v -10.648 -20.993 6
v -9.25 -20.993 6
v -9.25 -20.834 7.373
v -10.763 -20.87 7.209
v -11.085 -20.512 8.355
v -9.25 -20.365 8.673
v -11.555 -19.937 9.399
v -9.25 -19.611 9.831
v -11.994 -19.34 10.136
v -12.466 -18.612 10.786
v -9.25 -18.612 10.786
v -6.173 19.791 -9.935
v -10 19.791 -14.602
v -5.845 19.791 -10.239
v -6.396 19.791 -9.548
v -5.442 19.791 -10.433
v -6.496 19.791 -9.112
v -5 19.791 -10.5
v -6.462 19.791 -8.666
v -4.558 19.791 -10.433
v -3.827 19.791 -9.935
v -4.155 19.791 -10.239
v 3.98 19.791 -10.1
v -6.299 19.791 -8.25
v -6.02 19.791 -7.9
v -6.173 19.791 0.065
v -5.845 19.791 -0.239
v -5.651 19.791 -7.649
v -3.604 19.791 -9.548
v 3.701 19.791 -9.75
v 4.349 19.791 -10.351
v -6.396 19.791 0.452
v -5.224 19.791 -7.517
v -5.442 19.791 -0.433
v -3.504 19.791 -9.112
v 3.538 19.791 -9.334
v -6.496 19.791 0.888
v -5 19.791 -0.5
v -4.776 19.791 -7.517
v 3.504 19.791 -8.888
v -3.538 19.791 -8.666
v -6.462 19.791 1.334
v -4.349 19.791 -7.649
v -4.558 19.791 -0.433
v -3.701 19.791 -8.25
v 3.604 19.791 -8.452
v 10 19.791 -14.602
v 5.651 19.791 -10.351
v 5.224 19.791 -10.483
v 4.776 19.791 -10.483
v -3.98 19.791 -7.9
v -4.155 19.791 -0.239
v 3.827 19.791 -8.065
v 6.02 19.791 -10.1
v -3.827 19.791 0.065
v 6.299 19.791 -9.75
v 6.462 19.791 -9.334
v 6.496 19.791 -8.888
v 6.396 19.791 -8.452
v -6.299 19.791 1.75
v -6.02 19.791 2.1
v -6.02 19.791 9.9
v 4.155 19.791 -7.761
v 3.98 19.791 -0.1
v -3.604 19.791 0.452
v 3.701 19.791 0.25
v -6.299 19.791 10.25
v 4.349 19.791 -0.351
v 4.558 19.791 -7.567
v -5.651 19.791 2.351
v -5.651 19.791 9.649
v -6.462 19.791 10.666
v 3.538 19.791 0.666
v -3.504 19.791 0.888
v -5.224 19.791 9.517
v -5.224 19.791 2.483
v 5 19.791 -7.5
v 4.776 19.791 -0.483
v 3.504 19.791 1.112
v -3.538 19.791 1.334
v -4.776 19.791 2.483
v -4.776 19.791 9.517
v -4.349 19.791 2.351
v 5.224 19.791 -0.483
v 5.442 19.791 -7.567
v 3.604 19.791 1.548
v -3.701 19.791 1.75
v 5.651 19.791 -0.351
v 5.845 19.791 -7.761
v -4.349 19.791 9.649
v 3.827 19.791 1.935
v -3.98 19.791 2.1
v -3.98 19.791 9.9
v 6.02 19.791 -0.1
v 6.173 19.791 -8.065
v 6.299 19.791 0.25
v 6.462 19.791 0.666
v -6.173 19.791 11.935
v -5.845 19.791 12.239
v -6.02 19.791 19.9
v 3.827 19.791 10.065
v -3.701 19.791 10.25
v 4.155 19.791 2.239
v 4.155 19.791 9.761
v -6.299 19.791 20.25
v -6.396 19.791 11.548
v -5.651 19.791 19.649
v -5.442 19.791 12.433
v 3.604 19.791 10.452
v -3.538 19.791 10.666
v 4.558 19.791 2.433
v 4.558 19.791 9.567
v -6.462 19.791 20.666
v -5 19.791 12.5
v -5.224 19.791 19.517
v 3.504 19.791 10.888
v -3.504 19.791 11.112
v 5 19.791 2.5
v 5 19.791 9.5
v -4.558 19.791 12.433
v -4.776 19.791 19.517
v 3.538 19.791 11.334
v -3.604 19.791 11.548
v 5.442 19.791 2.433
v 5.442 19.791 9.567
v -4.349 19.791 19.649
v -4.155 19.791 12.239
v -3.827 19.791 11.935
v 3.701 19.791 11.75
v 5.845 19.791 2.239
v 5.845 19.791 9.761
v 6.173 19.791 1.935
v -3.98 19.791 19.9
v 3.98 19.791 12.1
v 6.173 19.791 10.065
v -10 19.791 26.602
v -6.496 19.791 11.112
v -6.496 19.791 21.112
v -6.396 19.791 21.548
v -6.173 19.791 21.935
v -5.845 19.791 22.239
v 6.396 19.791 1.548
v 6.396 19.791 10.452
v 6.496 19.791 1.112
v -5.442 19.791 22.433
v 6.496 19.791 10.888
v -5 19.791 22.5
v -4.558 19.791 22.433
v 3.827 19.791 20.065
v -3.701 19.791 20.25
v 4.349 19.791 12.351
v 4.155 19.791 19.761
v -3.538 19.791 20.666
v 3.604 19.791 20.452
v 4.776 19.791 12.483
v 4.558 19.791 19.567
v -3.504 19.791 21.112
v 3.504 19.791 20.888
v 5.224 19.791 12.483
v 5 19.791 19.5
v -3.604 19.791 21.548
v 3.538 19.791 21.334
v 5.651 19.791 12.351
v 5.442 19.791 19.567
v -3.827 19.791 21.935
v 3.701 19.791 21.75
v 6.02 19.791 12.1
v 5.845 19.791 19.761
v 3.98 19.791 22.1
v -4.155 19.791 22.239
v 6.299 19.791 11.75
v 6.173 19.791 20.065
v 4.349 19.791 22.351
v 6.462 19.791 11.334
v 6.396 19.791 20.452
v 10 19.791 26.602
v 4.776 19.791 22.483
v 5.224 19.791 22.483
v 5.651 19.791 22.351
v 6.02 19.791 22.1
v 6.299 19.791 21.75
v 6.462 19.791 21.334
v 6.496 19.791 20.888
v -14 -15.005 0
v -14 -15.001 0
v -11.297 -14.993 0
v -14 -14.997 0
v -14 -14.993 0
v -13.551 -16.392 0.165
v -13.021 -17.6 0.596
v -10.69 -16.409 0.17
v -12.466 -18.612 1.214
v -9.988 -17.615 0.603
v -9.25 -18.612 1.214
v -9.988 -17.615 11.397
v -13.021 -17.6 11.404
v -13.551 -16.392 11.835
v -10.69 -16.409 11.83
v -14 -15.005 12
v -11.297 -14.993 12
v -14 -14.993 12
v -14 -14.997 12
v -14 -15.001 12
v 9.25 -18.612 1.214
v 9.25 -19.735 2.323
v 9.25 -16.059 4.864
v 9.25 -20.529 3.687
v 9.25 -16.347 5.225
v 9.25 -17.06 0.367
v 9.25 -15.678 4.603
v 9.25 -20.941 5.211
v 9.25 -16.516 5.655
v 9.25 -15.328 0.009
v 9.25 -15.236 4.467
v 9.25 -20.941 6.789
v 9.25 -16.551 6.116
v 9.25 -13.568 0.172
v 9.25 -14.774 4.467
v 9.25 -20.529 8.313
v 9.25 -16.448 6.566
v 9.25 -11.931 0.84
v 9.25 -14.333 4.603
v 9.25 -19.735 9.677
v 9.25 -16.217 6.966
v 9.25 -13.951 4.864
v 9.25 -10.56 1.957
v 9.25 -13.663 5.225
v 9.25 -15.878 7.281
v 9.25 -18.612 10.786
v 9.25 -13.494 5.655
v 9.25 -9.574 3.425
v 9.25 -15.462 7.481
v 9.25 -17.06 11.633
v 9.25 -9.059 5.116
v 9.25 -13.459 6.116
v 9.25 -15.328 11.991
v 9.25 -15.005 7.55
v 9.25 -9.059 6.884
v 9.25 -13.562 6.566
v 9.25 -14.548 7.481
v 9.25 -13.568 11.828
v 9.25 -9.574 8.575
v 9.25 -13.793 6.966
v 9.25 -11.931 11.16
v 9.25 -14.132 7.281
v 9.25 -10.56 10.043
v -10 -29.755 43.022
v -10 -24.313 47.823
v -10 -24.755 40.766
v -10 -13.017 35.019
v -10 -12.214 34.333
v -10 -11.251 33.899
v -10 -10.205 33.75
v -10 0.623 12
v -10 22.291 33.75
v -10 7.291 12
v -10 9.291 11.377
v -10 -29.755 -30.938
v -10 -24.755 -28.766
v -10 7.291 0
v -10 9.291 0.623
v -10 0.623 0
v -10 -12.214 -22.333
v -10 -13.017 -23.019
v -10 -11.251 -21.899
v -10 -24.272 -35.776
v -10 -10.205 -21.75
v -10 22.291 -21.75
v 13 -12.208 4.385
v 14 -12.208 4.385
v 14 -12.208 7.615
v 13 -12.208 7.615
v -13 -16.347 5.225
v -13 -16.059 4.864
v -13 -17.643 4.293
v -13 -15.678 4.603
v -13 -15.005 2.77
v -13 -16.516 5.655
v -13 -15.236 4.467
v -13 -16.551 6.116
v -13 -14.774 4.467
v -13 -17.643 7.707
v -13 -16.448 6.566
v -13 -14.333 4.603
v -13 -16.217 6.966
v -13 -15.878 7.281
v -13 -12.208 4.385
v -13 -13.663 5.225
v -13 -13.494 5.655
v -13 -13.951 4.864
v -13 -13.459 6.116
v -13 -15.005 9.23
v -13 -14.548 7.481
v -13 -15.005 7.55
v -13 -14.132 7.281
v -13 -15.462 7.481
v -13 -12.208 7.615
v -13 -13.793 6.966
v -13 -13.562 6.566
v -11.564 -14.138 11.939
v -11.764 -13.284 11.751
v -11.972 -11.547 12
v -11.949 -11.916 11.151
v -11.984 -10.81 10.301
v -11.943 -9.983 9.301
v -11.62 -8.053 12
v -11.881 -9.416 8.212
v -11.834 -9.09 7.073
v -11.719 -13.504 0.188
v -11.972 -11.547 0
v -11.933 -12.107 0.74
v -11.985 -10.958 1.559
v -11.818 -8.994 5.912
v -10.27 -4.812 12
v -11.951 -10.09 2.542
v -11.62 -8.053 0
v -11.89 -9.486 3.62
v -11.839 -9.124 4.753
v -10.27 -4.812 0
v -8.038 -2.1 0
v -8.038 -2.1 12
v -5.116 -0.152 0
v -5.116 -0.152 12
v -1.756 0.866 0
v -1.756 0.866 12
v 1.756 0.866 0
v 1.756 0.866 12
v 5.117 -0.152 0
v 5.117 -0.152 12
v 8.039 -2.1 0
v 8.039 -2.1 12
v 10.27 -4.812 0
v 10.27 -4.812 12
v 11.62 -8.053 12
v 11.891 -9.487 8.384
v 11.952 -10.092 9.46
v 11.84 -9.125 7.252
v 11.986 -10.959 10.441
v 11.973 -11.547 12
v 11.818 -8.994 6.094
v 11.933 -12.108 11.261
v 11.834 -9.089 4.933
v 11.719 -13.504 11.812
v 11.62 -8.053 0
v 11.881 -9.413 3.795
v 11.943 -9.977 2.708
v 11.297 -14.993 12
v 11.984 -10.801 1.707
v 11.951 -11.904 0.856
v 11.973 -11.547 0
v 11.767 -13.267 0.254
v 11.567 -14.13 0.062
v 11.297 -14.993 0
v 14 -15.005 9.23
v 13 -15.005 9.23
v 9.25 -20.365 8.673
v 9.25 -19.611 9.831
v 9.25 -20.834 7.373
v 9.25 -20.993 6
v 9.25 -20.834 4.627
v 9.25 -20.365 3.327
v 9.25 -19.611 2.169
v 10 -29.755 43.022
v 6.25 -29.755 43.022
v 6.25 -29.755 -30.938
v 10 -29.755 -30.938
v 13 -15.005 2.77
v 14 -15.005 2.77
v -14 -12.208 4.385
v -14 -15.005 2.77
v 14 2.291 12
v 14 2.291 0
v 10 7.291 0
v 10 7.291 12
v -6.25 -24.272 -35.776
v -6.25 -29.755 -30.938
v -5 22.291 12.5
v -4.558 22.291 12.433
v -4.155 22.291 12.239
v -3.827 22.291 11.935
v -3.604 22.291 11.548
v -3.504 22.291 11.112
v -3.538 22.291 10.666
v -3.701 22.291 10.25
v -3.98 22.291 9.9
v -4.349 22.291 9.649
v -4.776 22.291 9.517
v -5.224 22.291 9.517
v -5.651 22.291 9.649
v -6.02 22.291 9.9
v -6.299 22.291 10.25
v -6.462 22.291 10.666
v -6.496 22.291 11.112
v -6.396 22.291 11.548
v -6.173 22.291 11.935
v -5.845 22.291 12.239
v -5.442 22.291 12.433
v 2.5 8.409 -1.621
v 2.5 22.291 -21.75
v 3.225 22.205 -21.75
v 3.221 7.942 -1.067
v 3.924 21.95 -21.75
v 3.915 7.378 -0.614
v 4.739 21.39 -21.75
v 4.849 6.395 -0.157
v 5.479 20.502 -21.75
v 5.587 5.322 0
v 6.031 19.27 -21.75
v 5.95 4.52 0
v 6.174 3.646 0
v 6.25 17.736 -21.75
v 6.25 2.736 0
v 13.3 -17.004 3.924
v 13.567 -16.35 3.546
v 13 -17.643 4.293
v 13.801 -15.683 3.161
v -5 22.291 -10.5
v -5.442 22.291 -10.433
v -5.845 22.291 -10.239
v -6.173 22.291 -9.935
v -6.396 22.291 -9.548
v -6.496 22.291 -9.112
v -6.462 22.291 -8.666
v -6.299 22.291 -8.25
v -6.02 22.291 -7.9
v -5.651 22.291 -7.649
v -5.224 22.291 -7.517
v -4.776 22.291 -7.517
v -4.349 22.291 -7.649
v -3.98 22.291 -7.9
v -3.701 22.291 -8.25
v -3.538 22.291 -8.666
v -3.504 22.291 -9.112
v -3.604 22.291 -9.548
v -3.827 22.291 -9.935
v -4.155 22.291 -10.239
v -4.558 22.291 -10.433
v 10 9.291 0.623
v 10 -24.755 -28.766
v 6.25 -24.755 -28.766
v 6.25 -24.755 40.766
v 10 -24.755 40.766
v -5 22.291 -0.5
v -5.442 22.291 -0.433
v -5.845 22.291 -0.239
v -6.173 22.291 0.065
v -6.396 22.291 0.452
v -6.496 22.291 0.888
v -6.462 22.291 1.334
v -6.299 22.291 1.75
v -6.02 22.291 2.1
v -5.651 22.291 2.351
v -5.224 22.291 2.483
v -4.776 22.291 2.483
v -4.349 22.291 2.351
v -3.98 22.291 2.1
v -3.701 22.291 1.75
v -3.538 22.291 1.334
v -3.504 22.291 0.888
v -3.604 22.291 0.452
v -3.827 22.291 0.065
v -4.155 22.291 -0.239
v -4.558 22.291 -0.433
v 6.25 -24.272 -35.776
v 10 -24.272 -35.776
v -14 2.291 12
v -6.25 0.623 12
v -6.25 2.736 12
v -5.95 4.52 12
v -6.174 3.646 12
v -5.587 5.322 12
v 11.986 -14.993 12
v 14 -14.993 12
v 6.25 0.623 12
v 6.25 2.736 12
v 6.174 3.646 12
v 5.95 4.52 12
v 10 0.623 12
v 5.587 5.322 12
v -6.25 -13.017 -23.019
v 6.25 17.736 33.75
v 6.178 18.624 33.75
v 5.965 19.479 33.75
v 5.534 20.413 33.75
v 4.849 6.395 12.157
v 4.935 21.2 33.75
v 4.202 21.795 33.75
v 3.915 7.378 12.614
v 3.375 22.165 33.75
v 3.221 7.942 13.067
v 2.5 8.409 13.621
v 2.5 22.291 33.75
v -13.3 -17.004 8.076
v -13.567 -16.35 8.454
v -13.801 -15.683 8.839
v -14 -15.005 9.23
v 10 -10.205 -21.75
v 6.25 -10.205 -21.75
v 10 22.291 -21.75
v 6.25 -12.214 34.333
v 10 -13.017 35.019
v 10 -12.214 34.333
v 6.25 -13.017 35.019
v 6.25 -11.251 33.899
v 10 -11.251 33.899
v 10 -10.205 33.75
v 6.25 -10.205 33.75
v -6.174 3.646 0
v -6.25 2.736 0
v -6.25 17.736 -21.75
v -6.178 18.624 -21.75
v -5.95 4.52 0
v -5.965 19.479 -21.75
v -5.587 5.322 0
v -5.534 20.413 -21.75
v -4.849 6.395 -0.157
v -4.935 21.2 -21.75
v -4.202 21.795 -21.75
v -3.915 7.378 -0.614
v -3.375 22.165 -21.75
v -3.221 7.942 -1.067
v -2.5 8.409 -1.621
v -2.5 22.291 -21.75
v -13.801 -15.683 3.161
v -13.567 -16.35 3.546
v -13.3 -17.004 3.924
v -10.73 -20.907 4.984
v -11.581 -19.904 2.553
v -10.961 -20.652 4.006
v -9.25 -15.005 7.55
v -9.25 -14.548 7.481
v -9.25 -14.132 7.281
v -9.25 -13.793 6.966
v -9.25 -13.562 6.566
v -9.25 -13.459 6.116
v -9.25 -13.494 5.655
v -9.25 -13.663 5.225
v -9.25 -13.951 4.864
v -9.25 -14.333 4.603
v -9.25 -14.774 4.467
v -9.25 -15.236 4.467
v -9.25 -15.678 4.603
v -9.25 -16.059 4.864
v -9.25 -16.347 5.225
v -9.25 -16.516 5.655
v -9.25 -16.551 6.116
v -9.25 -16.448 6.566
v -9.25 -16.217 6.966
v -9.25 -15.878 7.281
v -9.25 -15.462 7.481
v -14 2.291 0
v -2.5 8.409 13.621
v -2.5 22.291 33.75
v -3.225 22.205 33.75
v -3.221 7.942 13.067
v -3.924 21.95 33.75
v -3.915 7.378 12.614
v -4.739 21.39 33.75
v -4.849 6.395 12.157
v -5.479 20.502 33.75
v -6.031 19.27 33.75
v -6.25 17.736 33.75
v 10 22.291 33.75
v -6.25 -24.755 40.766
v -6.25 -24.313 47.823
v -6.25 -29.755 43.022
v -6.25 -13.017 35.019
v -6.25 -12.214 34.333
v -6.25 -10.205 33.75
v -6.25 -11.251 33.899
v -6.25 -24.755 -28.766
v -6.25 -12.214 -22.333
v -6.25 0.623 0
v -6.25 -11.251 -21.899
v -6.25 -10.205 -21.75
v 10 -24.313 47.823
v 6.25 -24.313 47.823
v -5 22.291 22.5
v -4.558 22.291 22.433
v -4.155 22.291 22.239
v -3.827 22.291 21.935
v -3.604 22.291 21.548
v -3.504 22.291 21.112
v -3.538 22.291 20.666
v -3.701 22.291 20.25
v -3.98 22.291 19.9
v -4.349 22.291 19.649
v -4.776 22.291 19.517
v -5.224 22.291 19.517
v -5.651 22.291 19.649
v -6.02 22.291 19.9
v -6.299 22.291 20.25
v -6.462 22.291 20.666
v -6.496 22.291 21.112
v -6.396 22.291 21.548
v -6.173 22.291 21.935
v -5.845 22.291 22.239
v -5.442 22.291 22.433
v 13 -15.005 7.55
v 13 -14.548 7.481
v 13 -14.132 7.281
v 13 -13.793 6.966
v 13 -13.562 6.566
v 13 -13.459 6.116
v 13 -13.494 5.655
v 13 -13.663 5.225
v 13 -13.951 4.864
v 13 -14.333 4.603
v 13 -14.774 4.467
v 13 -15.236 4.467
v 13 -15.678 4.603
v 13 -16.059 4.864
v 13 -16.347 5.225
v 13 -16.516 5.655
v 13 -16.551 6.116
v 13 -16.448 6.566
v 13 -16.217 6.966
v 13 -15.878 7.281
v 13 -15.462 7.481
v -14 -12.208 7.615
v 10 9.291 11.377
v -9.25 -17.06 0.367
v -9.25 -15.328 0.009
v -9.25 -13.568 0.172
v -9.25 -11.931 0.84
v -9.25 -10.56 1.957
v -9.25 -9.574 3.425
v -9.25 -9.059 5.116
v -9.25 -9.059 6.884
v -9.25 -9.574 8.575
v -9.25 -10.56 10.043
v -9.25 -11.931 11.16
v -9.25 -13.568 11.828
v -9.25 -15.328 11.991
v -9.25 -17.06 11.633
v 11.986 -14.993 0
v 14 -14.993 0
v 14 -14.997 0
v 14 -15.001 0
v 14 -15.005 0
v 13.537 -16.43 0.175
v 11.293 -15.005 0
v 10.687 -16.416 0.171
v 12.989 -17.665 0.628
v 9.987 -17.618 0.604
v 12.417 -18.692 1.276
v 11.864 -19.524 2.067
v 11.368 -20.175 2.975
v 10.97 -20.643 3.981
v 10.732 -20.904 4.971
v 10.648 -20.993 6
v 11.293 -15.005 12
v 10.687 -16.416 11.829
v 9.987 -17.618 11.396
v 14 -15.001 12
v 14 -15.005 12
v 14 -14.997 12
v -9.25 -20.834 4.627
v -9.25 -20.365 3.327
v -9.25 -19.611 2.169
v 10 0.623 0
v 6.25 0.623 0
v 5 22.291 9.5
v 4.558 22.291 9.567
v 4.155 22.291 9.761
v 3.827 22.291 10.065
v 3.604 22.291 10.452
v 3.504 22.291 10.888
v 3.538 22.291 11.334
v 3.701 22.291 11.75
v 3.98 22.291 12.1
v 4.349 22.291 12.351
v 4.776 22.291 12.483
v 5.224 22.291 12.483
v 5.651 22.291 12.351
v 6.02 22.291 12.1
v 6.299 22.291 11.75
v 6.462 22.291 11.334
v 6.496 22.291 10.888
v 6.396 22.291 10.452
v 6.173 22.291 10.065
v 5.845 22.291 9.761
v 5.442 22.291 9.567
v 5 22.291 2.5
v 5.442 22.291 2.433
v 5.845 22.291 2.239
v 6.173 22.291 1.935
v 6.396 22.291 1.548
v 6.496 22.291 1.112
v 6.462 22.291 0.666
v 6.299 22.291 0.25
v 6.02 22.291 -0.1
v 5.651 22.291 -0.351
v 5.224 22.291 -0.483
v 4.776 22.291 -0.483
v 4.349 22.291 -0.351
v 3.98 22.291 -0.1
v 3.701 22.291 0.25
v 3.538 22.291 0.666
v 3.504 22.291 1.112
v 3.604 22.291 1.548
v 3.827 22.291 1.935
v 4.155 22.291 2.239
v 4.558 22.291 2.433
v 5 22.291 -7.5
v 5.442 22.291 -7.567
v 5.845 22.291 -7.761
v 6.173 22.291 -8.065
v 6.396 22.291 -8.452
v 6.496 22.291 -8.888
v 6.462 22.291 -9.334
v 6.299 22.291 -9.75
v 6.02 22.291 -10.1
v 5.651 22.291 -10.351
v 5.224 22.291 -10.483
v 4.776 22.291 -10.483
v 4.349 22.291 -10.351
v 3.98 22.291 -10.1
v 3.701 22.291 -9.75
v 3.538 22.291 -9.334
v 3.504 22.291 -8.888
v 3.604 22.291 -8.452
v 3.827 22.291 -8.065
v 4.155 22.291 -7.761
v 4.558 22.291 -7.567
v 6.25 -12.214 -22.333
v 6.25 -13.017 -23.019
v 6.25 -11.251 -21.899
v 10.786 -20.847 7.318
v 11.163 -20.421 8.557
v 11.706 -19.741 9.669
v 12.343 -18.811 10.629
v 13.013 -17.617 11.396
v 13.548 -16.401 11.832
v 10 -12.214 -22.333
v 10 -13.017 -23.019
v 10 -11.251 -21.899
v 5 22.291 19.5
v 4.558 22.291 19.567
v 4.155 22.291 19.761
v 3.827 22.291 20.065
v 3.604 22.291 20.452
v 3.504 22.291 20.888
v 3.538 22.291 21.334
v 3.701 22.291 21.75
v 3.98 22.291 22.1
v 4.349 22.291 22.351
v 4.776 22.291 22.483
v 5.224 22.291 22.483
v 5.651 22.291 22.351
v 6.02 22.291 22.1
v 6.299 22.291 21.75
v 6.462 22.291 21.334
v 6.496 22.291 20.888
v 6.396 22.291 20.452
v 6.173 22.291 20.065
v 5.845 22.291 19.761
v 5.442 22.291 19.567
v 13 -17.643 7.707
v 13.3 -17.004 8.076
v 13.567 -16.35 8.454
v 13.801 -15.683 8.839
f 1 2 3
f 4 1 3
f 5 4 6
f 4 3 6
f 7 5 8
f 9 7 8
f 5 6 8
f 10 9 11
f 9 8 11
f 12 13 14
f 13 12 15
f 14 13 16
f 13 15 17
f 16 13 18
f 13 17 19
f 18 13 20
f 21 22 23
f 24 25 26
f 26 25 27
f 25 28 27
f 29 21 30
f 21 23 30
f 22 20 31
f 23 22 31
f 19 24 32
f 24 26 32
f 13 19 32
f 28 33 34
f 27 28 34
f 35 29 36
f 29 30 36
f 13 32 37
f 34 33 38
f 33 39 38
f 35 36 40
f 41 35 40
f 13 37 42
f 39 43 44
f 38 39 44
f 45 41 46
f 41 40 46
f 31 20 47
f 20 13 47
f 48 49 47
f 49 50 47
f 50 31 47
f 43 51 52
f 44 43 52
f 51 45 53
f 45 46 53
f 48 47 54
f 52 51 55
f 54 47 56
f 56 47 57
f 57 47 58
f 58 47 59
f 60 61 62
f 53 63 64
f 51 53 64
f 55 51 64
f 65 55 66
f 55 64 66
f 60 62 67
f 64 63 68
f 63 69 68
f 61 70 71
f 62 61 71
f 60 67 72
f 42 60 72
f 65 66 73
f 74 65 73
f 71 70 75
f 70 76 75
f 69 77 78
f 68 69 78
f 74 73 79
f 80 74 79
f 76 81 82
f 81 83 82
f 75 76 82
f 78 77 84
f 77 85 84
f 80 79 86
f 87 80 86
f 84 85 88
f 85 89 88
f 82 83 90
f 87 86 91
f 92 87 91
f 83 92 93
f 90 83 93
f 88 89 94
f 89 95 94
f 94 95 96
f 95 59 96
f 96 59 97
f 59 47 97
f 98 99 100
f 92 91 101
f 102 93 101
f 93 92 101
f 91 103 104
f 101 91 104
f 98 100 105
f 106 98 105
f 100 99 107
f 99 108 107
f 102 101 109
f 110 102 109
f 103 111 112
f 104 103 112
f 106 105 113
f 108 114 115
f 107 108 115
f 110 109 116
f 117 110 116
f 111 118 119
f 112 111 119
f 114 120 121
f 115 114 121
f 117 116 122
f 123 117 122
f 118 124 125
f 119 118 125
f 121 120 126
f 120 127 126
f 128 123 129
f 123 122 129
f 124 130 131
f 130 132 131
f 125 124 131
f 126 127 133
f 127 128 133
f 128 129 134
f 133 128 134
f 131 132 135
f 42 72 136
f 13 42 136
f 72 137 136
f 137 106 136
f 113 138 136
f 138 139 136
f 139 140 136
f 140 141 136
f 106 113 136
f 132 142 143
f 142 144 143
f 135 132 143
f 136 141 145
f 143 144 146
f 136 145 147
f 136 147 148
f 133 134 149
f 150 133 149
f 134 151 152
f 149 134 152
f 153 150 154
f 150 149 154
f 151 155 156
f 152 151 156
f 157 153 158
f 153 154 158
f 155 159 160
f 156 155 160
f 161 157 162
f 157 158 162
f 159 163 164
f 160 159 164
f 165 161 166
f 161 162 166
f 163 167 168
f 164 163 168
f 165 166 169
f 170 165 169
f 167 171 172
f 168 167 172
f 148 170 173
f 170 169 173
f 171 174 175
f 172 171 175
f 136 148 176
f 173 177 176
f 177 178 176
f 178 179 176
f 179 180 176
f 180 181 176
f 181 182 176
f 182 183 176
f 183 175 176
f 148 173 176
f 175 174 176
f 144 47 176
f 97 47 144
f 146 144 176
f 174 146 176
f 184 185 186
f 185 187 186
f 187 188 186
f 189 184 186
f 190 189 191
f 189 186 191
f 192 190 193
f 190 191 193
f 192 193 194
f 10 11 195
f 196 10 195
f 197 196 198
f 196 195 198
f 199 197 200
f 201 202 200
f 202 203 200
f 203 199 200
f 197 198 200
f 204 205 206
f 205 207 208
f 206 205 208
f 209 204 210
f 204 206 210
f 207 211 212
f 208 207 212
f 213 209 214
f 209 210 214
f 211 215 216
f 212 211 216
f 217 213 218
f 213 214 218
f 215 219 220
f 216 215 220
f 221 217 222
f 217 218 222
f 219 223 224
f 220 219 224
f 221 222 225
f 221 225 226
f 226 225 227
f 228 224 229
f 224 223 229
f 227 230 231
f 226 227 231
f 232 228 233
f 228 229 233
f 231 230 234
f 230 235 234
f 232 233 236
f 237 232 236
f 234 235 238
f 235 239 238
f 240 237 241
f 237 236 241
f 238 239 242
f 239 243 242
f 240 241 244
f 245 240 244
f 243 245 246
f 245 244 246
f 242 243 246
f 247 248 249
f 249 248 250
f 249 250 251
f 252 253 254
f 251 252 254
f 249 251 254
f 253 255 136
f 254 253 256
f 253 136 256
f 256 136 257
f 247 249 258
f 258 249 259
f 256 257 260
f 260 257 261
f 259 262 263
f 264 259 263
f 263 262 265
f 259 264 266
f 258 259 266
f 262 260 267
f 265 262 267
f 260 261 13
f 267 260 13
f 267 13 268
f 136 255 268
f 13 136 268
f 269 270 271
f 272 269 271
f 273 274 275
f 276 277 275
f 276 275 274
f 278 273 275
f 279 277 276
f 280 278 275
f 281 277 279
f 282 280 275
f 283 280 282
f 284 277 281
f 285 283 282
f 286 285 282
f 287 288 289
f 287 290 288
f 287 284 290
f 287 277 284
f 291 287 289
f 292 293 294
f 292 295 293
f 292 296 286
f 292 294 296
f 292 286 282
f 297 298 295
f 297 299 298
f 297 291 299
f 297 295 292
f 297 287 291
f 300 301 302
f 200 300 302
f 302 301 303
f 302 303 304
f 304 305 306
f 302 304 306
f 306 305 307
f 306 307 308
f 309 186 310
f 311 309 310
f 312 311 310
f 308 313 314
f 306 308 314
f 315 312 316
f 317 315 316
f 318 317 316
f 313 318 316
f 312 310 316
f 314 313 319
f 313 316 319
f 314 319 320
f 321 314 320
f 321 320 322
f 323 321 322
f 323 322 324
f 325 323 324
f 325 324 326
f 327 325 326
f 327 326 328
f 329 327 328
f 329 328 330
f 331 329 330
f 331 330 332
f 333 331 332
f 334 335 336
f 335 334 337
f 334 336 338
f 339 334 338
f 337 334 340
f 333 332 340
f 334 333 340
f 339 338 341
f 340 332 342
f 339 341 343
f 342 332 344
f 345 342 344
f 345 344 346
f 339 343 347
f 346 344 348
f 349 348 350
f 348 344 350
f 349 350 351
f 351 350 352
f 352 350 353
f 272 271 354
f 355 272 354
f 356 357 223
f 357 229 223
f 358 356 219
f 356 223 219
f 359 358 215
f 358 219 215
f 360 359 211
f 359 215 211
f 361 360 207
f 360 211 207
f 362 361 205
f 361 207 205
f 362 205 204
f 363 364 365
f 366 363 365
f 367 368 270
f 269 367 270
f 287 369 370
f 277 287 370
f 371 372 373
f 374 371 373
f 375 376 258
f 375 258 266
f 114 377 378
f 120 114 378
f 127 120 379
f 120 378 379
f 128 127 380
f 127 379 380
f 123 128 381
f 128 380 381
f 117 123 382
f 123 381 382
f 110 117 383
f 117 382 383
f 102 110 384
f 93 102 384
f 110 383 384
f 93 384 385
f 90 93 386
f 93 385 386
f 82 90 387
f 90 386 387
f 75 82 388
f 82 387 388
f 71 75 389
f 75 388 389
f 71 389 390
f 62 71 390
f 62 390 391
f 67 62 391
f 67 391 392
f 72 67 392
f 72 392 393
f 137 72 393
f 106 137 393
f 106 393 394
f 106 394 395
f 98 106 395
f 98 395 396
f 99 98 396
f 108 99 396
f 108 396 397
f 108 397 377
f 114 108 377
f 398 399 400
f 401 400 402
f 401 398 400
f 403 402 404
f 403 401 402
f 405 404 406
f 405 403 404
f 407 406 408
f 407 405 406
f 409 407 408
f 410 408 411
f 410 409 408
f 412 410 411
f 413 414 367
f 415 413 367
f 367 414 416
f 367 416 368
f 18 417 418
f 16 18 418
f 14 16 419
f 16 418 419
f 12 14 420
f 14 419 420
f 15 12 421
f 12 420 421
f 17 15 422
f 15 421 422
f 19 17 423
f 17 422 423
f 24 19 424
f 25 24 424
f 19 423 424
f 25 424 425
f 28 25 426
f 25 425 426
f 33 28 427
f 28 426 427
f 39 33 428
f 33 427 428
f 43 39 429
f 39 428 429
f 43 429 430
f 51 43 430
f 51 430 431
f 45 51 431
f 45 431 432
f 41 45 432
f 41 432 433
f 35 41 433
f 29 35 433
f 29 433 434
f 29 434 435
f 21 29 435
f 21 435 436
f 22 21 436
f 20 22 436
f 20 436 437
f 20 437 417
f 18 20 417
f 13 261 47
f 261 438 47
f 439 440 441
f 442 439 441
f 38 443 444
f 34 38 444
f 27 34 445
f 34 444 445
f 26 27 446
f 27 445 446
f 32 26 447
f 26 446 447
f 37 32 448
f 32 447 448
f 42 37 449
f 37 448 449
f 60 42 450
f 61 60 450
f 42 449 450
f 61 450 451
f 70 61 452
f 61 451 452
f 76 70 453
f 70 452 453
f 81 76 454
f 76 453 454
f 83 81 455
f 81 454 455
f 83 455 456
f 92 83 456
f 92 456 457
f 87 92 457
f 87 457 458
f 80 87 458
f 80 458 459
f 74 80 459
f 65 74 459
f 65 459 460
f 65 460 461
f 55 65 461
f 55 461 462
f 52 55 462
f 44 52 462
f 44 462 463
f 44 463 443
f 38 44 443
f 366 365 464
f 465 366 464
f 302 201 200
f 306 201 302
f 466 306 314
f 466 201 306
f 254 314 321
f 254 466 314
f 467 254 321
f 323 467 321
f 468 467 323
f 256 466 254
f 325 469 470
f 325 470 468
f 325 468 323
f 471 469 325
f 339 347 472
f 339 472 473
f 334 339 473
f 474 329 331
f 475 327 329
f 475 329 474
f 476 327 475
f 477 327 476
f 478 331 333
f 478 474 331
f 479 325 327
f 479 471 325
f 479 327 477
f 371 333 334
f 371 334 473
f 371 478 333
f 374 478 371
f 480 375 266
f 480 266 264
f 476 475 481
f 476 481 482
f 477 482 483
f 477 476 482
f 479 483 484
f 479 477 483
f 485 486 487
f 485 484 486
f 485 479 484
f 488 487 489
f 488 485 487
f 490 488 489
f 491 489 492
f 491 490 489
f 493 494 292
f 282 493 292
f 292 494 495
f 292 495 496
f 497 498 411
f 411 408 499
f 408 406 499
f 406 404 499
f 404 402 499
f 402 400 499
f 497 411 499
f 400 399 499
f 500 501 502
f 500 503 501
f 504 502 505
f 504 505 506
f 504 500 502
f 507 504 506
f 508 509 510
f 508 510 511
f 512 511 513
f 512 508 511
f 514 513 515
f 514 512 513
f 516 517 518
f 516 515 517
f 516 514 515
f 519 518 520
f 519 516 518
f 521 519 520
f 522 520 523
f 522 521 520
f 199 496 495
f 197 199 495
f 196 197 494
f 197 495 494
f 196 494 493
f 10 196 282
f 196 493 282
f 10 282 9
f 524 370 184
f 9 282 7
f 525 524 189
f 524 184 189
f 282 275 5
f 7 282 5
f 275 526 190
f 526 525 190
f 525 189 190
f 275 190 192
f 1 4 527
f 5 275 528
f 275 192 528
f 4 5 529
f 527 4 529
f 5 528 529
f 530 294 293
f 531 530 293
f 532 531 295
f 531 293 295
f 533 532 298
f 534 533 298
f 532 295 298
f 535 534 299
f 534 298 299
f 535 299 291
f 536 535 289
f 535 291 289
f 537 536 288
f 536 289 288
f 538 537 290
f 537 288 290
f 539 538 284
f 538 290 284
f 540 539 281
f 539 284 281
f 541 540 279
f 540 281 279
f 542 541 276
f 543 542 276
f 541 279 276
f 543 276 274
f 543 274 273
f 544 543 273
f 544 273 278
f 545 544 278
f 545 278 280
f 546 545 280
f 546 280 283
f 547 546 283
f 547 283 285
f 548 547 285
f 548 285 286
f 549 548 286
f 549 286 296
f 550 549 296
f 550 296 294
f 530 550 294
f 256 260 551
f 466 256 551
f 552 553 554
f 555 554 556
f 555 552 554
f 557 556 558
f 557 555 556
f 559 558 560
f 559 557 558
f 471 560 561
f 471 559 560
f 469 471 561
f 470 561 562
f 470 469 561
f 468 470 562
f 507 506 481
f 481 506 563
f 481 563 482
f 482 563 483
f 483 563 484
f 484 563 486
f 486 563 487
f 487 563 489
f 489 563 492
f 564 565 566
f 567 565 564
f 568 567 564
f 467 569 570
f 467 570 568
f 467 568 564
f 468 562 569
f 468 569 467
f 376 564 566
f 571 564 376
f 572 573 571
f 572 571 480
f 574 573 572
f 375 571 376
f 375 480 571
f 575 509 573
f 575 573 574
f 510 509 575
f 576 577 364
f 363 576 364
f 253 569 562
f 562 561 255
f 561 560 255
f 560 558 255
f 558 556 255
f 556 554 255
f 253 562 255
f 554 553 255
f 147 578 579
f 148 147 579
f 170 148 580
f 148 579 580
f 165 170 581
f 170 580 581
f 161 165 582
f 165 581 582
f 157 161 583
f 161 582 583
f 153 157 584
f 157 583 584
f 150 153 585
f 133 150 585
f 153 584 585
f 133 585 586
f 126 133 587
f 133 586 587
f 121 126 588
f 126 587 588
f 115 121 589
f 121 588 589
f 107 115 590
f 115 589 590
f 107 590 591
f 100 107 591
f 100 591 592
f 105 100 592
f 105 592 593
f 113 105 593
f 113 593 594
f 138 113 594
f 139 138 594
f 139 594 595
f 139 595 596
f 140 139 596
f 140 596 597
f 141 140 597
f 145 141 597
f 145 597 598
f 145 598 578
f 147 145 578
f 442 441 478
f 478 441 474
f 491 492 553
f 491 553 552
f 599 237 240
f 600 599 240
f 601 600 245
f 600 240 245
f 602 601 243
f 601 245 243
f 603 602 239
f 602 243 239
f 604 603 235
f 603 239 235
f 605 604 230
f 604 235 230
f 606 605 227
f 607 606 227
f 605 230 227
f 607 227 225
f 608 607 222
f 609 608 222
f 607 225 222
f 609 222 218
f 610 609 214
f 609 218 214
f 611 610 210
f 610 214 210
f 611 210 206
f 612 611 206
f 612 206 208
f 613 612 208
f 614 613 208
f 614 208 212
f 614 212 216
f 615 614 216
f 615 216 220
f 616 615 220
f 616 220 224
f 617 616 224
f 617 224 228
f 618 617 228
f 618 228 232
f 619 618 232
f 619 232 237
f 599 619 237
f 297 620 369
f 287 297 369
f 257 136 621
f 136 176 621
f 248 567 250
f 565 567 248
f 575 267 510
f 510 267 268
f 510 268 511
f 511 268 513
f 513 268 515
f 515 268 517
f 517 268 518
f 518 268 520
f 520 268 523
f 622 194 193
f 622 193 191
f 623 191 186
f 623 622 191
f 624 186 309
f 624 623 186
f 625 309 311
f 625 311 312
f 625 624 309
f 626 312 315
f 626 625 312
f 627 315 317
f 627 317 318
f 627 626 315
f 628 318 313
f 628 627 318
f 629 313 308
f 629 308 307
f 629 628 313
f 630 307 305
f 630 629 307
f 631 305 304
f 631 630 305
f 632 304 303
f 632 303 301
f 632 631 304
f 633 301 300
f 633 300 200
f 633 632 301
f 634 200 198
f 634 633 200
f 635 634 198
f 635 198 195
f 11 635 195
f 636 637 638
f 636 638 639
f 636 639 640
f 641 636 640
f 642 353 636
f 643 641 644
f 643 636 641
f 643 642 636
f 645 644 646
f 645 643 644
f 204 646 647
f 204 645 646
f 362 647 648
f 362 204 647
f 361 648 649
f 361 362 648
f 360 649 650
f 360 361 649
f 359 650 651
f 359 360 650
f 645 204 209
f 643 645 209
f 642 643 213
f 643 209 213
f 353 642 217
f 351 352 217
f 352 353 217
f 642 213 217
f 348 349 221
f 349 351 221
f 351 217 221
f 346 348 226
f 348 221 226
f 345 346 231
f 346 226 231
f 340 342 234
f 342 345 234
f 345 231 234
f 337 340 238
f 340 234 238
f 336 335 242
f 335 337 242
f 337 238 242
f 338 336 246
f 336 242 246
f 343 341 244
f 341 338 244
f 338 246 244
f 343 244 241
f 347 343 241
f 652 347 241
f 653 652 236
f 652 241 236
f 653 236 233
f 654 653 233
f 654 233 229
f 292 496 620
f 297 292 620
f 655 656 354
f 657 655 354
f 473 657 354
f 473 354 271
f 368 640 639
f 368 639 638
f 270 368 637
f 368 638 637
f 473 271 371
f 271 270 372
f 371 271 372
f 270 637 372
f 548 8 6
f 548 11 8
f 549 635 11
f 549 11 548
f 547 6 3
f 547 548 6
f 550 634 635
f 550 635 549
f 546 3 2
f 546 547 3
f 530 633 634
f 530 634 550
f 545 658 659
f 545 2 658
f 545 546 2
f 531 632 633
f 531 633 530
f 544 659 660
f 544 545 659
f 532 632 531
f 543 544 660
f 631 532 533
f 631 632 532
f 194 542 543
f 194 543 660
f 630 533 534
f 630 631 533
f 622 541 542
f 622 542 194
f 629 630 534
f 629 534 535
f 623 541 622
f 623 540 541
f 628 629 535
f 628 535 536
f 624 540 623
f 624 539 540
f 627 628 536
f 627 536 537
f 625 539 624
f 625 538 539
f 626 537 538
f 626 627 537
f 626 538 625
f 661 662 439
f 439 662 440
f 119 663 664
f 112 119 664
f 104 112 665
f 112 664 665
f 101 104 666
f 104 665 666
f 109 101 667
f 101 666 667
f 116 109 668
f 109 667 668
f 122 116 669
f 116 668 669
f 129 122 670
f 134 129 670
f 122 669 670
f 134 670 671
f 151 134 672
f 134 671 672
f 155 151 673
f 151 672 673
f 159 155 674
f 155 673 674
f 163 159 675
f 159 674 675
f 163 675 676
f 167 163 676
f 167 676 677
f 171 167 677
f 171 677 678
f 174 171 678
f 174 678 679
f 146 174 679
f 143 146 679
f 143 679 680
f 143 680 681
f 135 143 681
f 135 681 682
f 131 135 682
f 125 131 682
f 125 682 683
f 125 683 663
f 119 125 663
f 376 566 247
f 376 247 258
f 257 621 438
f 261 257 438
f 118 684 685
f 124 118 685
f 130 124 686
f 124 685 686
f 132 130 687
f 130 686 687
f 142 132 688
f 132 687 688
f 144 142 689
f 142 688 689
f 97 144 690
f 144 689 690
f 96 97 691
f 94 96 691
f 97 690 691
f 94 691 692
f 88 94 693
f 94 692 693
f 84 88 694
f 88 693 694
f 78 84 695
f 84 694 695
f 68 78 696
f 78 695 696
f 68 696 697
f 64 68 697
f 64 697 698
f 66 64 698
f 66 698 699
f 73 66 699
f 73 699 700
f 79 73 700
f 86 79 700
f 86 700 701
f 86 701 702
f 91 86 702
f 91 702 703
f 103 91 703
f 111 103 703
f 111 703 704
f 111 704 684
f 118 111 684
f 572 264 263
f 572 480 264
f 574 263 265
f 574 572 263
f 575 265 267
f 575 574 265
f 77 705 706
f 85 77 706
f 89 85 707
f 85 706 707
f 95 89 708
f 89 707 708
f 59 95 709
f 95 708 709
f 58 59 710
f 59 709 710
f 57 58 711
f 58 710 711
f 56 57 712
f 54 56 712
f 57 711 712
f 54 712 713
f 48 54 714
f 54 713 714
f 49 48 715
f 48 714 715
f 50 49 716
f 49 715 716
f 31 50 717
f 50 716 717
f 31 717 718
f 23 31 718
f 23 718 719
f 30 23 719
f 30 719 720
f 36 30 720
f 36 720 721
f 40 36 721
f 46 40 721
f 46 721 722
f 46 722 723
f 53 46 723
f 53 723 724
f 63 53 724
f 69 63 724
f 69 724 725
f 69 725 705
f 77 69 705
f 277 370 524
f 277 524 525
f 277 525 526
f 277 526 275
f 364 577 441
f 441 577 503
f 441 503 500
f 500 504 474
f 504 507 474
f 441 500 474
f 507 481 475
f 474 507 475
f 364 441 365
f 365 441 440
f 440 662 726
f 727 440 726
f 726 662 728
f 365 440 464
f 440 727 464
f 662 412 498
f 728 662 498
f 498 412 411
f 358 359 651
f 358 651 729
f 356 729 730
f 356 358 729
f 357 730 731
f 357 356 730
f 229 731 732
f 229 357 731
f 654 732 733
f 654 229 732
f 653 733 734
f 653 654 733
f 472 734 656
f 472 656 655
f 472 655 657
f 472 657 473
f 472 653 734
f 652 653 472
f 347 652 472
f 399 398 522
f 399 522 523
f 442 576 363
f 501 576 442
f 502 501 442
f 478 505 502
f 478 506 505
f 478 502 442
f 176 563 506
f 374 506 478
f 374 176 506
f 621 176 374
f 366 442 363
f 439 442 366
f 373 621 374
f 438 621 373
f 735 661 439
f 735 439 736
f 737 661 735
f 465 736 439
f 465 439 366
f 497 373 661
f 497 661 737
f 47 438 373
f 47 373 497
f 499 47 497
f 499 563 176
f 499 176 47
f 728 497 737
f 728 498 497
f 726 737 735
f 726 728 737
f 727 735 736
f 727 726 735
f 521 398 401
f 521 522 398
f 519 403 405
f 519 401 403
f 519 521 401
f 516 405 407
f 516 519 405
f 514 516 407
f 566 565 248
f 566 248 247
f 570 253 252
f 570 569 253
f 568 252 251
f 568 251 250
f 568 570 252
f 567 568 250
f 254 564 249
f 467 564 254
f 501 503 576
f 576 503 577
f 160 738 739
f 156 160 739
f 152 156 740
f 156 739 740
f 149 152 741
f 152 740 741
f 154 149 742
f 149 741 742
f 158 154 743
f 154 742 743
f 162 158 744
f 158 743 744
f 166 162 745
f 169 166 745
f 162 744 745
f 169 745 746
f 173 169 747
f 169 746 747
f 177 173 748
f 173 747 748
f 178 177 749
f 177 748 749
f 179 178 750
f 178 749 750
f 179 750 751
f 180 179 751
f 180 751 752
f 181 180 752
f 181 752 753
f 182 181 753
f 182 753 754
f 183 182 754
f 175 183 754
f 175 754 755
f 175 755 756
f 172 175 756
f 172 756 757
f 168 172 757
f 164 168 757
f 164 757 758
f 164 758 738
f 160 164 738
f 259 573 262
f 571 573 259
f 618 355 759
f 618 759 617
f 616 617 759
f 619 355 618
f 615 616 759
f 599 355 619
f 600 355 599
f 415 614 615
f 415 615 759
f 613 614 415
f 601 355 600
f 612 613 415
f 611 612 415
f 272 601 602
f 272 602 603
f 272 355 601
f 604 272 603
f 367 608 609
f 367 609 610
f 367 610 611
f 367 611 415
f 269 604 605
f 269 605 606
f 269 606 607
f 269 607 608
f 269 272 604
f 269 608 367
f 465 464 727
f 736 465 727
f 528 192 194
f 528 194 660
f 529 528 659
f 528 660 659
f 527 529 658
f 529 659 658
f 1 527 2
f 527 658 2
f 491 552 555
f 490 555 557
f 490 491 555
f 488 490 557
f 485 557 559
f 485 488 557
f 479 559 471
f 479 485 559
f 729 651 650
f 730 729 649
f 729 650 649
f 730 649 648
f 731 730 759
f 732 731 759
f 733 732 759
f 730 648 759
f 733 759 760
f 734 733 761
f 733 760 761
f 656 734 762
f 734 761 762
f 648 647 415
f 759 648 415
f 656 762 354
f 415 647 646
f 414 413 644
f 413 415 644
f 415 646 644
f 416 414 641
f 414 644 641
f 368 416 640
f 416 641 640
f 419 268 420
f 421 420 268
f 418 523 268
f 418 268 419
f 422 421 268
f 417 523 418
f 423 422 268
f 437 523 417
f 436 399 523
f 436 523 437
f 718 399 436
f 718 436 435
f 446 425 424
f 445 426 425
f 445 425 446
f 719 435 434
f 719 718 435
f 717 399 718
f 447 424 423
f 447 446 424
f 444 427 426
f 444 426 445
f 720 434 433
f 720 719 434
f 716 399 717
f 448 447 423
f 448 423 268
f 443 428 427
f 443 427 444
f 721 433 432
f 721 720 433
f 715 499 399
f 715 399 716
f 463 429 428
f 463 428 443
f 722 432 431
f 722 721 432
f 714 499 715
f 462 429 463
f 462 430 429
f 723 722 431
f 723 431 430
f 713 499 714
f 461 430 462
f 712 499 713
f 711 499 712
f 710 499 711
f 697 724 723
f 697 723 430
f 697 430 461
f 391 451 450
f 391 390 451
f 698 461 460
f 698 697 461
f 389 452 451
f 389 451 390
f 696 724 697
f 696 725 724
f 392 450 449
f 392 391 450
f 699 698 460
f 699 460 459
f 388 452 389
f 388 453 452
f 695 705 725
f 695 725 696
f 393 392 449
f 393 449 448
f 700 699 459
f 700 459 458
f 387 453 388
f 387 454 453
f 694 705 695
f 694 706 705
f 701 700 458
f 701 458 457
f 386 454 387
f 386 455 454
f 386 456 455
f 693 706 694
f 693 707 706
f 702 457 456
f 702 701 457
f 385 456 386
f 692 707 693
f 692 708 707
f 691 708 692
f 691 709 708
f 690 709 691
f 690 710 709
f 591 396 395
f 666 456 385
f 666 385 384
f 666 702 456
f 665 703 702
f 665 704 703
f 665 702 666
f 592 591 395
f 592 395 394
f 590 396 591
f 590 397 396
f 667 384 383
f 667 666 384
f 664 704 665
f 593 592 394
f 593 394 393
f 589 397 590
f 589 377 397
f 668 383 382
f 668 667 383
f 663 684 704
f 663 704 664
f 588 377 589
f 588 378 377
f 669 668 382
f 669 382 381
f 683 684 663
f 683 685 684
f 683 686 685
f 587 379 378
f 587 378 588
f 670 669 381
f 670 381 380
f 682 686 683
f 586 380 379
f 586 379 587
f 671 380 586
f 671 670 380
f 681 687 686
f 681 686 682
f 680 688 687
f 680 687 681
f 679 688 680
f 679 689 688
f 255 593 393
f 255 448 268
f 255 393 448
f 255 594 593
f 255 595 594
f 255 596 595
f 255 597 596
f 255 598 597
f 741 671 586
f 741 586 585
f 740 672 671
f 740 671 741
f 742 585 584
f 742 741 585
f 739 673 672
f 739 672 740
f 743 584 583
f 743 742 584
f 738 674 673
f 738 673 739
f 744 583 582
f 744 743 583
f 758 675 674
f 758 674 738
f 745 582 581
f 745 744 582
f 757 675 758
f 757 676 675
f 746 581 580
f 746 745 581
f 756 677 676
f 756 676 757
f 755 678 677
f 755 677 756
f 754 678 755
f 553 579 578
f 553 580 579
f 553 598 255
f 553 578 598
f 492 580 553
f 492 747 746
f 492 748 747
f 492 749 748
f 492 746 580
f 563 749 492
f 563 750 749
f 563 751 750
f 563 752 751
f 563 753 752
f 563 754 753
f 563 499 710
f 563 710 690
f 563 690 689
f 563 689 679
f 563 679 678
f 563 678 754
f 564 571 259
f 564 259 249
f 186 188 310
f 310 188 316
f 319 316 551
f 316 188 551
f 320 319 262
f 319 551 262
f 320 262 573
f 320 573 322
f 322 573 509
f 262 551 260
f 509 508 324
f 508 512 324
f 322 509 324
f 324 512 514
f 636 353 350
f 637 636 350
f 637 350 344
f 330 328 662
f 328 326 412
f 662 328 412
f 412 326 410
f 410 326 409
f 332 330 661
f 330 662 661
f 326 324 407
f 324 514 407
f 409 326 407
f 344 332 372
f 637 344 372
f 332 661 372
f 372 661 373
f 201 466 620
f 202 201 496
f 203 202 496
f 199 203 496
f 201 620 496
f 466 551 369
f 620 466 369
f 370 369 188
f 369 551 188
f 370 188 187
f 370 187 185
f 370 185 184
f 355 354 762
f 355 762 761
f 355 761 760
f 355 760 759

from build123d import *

# Parameters (mm, degrees)
EXTRUDE_1_DEPTH      = 12
EXTRUDE_2_REACH      = 35.545
EXTRUDE_2_END_RADIUS = 11.985372339
SKETCH_2_R           = 6
MIRROR_START         = 9.249795062
MIRROR_1_DEPTH       = 2.735782315
MIRROR_1_2_DEPTH     = 0.000409876
CUT_EXTRUDE_1_DEPTH  = 34.545141776
CUT_EXTRUDE_2_DEPTH  = 1
CUT_EXTRUDE_3_DEPTH  = 1
MIRROR_START_2       = 9.250204938
MIRROR_3_DEPTH       = 5.749795062
SKETCH_6_R           = 1.55
CUT_EXTRUDE_4_DEPTH  = 37.245193425
SKETCH_12_W          = 20
SKETCH_12_H          = 12
EXTRUDE_4_DEPTH      = 5
EXTRUDE_5_DEPTH      = 10
EXTRUDE_6_DEPTH      = 12
EXTRUDE_7_DEPTH      = 3.75
EXTRUDE_8_DEPTH      = 3.75
FILLET_1_R           = 3.75
FILLET_2_R           = 3.75
SKETCH_21_R          = 1.5
CUT_EXTRUDE_5_DEPTH  = 3


with BuildPart() as part:
    # 스케치1 → 보스-돌출1 (new body)
    with BuildSketch(Plane.XY):
        with BuildLine():
            Line((14.000204938, 2.291069809), (-13.999795062, 2.291069809))
            Line((-13.999795062, 2.291069809), (-13.999795062, -6.939240191))
            Line((-13.999795062, -6.939240191), (-13.999795062, -15.005030191))
            ThreePointArc((-13.999795062, -15.005030191), (-12.699794, -18.209549332), (-10.647895062, -20.993190191))
            Line((-10.647895062, -20.993190191), (-9.249795062, -20.993190191))
            Line((-9.249795062, -20.993190191), (-9.249795062, -18.61185417))
            ThreePointArc((-9.249795062, -18.61185417), (-10.428409882, -16.897436148), (-11.292795062, -15.005030191))
            ThreePointArc((-11.292795062, -15.005030191), (0.000204938, 0.99497801), (11.293204938, -15.005030191))
            ThreePointArc((11.293204938, -15.005030191), (10.428819757, -16.897436148), (9.250204938, -18.61185417))
            Line((9.250204938, -18.61185417), (9.250204938, -20.993190191))
            Line((9.250204938, -20.993190191), (10.648304938, -20.993190191))
            ThreePointArc((10.648304938, -20.993190191), (12.700203875, -18.209549332), (14.000204938, -15.005030191))
            Line((14.000204938, -15.005030191), (14.000204938, -6.939240191))
            Line((14.000204938, -6.939240191), (14.000204938, 2.291069809))
        make_face()
    extrude(amount=EXTRUDE_1_DEPTH)

    # 보스-돌출2: up to this cylinder (the profile starts inside it)
    extrude_2_end = Plane(origin=(0.000204938, -10.990394329, 6), z_dir=(0, 0, -1)) * Cylinder(EXTRUDE_2_END_RADIUS, 96.060744678, mode=Mode.PRIVATE)
    # 스케치2 → 보스-돌출2 (add, up to the surface)
    with BuildSketch(Plane(origin=(-9.249795062, 0, 0), x_dir=(0, 0, -1), z_dir=(1, 0, 0)), mode=Mode.PRIVATE) as extrude_2_sk1:
        with Locations((-6, -14.993190191)):
            Circle(SKETCH_2_R)
    extrude_2_tool1 = extrude(extrude_2_sk1.sketch, amount=-EXTRUDE_2_REACH, mode=Mode.PRIVATE) & extrude_2_end
    add(extrude_2_tool1.solids().sort_by_distance((-9.249795, -14.99319, 6))[0])

    # 대칭 복사1: read off the stored shape, not the designer's step
    # 대칭 복사1 outline → 대칭 복사1 (add)
    with BuildSketch(Plane.YZ.offset(MIRROR_START)):
        with BuildLine():
            ThreePointArc((-18.61185417, 1.214054847), (-8.993190191, 6), (-18.61185417, 10.785945153))
            Line((-18.61185417, 10.785945153), (-18.61185417, 1.214054847))
        make_face()
    extrude(amount=MIRROR_1_DEPTH)

    # Mirror 1 2 outline → Mirror 1 2 (add)
    with BuildSketch(Plane.YZ.offset(MIRROR_START)):
        with BuildLine():
            Line((-18.61185417, 1.214054847), (-18.61185417, 10.785945153))
            ThreePointArc((-18.61185417, 10.785945153), (-20.993190191, 6), (-18.61185417, 1.214054847))
        make_face()
    extrude(amount=MIRROR_1_2_DEPTH)

    # 스케치3 → 컷-돌출1 (cut, through all)
    with BuildSketch(Plane(origin=(-9.249795062, 0, 0), x_dir=(0, 0, -1), z_dir=(1, 0, 0))):
        with BuildLine():
            Line((-6, -20.993190191), (0, -20.993190191))
            Line((0, -20.993190191), (0, -18.61185417))
            Line((0, -18.61185417), (-1.214054847, -18.61185417))
            ThreePointArc((-1.214054847, -18.61185417), (-3.327172272, -20.364967545), (-6, -20.993190191))
        make_face()
        with BuildLine():
            Line((-12, -20.993190191), (-6, -20.993190191))
            ThreePointArc((-6, -20.993190191), (-8.672827728, -20.364967545), (-10.785945153, -18.61185417))
            Line((-10.785945153, -18.61185417), (-12, -18.61185417))
            Line((-12, -18.61185417), (-12, -20.993190191))
        make_face()
        with BuildLine():
            Line((-12, -18.61185417), (-10.785945153, -18.61185417))
            ThreePointArc((-10.785945153, -18.61185417), (-11.688394805, -16.901635773), (-12, -14.993190191))
            Line((-12, -14.993190191), (-12, -18.61185417))
        make_face()
        with BuildLine():
            Line((-1.214054847, -18.61185417), (0, -18.61185417))
            Line((0, -18.61185417), (0, -14.993190191))
            ThreePointArc((0, -14.993190191), (-0.311605195, -16.901635773), (-1.214054847, -18.61185417))
        make_face()
    extrude(amount=-CUT_EXTRUDE_1_DEPTH, mode=Mode.SUBTRACT)

    # 스케치4 → 컷-돌출2 (cut)
    with BuildSketch(Plane.ZY.offset(13.999795062)):
        Polygon((9.23, -15.005030191), (7.615, -12.207768137), (4.385, -12.207768137), (2.77, -15.005030191), (4.385, -17.802292245), (7.615, -17.802292245), align=None)
    extrude(amount=-CUT_EXTRUDE_2_DEPTH, mode=Mode.SUBTRACT)

    # 스케치5 → 컷-돌출3 (cut)
    with BuildSketch(Plane(origin=(14.000204938, 0, 0), x_dir=(0, 0, -1), z_dir=(1, 0, 0))):
        Polygon((-2.77, -15.005030191), (-4.385, -12.207768137), (-7.615, -12.207768137), (-9.23, -15.005030191), (-7.615, -17.802292245), (-4.385, -17.802292245), align=None)
    extrude(amount=-CUT_EXTRUDE_3_DEPTH, mode=Mode.SUBTRACT)

    # 대칭 복사3: read off the stored shape, not the designer's step
    # 대칭 복사3 outline → 대칭 복사3 (cut)
    with BuildSketch(Plane.YZ.offset(MIRROR_START_2)):
        with BuildLine():
            ThreePointArc((-20.993190191, 6), (-19.235830878, 10.242640687), (-14.993190191, 12))
            Line((-14.993190191, 12), (-20.993190191, 12))
            Line((-20.993190191, 12), (-20.993190191, 6))
        make_face()
        with BuildLine():
            Line((-20.993190191, 0), (-14.993190191, 0))
            ThreePointArc((-14.993190191, 0), (-19.235830878, 1.757359313), (-20.993190191, 6))
            Line((-20.993190191, 6), (-20.993190191, 0))
        make_face()
    extrude(amount=MIRROR_3_DEPTH, mode=Mode.SUBTRACT)

    # 스케치6 → 컷-돌출4 (cut, through all)
    with BuildSketch(Plane.ZY.offset(12.999795062)):
        with Locations((6, -15.005030191)):
            Circle(SKETCH_6_R)
    extrude(amount=-CUT_EXTRUDE_4_DEPTH, mode=Mode.SUBTRACT)

    # 스케치12 → 보스-돌출4 (add)
    with BuildSketch(Plane(origin=(0, 2.291069809, 0), x_dir=(1, 0, 0), z_dir=(0, 1, 0))):
        with Locations((0, -6)):
            Rectangle(SKETCH_12_W, SKETCH_12_H)
    extrude(amount=EXTRUDE_4_DEPTH)

    # 스케치14 → 보스-돌출5 (add, symmetric)
    with BuildSketch(Plane(origin=(0, 0, 0), x_dir=(0, 0, -1), z_dir=(1, 0, 0))):
        Polygon((-12, 7.291069809), (0, 7.291069809), (21.75, 22.291069809), (-33.75, 22.291069809), align=None)
        Polygon((-11.377217009, 9.291069809), (-0.622782991, 9.291069809), (14.602217009, 19.791069809), (-26.602217009, 19.791069809), align=None, mode=Mode.SUBTRACT)
    extrude(amount=EXTRUDE_5_DEPTH, both=True)

    # 스케치15 → 보스-돌출6 (add)
    with BuildSketch(Plane.XY.offset(12)):
        Polygon((-10, 7.291069809), (-13.999795062, 2.291069809), (-10, 2.291069809), align=None)
        Polygon((10, 2.291069809), (14.000204938, 2.291069809), (10, 7.291069809), align=None)
    extrude(amount=-EXTRUDE_6_DEPTH)

    # 스케치19 → 보스-돌출7 (add)
    with BuildSketch(Plane(origin=(6.25, 0, 0), x_dir=(0, 0, -1), z_dir=(1, 0, 0))):
        Polygon((-12, 7.291069809), (-47.823129142, -24.313497594), (-43.022395989, -29.755030191), (30.938064105, -29.755030191), (35.775707613, -24.271660464), (0, 7.291069809), (0, 0.623337928), (28.765859914, -24.755030191), (-40.765859914, -24.755030191), (-12, 0.623337928), align=None)
    extrude_7 = extrude(amount=EXTRUDE_7_DEPTH)

    # 대칭 복사4: 보스-돌출7 across plane
    add(extrude_7.mirror(Plane(origin=(0, 0, 0), x_dir=(0, 0, 1), z_dir=(1, 0, 0))))

    # 스케치20 → 보스-돌출8 (add)
    with BuildSketch(Plane(origin=(10, 0, 0), x_dir=(0, 0, -1), z_dir=(1, 0, 0))):
        Polygon((-12, 7.291069809), (-33.75, 22.291069809), (-33.75, -11.897631945), align=None)
        Polygon((21.75, 22.291069809), (21.75, -11.897631945), (0, 7.291069809), align=None)
    extrude_8 = extrude(amount=-EXTRUDE_8_DEPTH)

    # 대칭 복사5: 보스-돌출8 across plane
    add(extrude_8.mirror(Plane(origin=(0, 0, 0), x_dir=(0, 0, 1), z_dir=(1, 0, 0))))

    # 필렛1
    # the kernel refuses this fillet: 3.75 mm, written as the material it adds along each edge
    with BuildSketch(Plane(origin=(-6.25, 7.291069809, 0), x_dir=(0, -1, 0), z_dir=(1, 0, 0))) as fillet_1_piece_1_section:
        with BuildLine():
            CenterArc((FILLET_1_R * 0.525097583021, FILLET_1_R), FILLET_1_R, 214.592288688, 55.407711312)
            Line((-FILLET_1_R * 0.298115202894, FILLET_1_R * 0.432267044196), (0, 0))
            Line((0, 0), (FILLET_1_R * 0.525097583021, 0))
        make_face()
    fillet_1_piece_1 = extrude(amount=17.422789841, mode=Mode.PRIVATE)
    fillet_1_piece_1 = split(fillet_1_piece_1, bisect_by=Plane(origin=(10, 7.291069809, 0), z_dir=(-1, 0, 0)), keep=Keep.TOP, mode=Mode.PRIVATE)
    add(fillet_1_piece_1)
    with BuildSketch(Plane(origin=(11.172789841, 7.291069809, 12), x_dir=(0, -1, 0), z_dir=(-1, 0, 0))) as fillet_1_piece_2_section:
        with BuildLine():
            CenterArc((FILLET_1_R * 0.525097583021, FILLET_1_R), FILLET_1_R, 214.592288688, 55.407711312)
            Line((-FILLET_1_R * 0.298115202894, FILLET_1_R * 0.432267044196), (0, 0))
            Line((0, 0), (FILLET_1_R * 0.525097583021, 0))
        make_face()
    fillet_1_piece_2 = extrude(amount=17.422789841, mode=Mode.PRIVATE)
    fillet_1_piece_2 = split(fillet_1_piece_2, bisect_by=Plane(origin=(10, 7.291069809, 12), z_dir=(-1, 0, 0)), keep=Keep.TOP, mode=Mode.PRIVATE)
    add(fillet_1_piece_2)
    with BuildSketch(Plane(origin=(6.25, 1.968573348, 4.282380132), x_dir=(-1, 0, 0), z_dir=(0, 0.5677329558036596, 0.8232127859153063))) as fillet_1_piece_3_section:
        with BuildLine():
            CenterArc((FILLET_1_R, FILLET_1_R), FILLET_1_R, 180, 90)
            Line((0, FILLET_1_R), (0, 0))
            Line((0, 0), (FILLET_1_R, 0))
        make_face()
    fillet_1_piece_3 = extrude(amount=45.170872431, mode=Mode.PRIVATE)
    fillet_1_piece_3 = split(fillet_1_piece_3, bisect_by=Plane(origin=(6.25, 1.968573348, 12), z_dir=(0, 0, 1)), keep=Keep.TOP, mode=Mode.PRIVATE)
    fillet_1_piece_3 = split(fillet_1_piece_3, bisect_by=Plane(origin=(6.25, 1.968573348, 33.75), z_dir=(0, 0, -1)), keep=Keep.TOP, mode=Mode.PRIVATE)
    add(fillet_1_piece_3)
    with BuildSketch(Plane(origin=(6.25, 1.968573348, 7.717619868), x_dir=(0, -0.8232127859153062, -0.5677329558036597), z_dir=(0, 0.5677329558036597, -0.8232127859153062))) as fillet_1_piece_4_section:
        with BuildLine():
            CenterArc((FILLET_1_R, FILLET_1_R), FILLET_1_R, 180, 90)
            Line((0, FILLET_1_R), (0, 0))
            Line((0, 0), (FILLET_1_R, 0))
        make_face()
    fillet_1_piece_4 = extrude(amount=45.170872431, mode=Mode.PRIVATE)
    fillet_1_piece_4 = split(fillet_1_piece_4, bisect_by=Plane(origin=(6.25, 1.968573348, 0), z_dir=(0, 0, -1)), keep=Keep.TOP, mode=Mode.PRIVATE)
    fillet_1_piece_4 = split(fillet_1_piece_4, bisect_by=Plane(origin=(6.25, 1.968573348, -21.75), z_dir=(0, 0, 1)), keep=Keep.TOP, mode=Mode.PRIVATE)
    add(fillet_1_piece_4)
    with BuildSketch(Plane(origin=(-6.25, 1.968573348, 4.282380132), x_dir=(0, -0.8232127859153063, 0.5677329558036595), z_dir=(0, 0.5677329558036596, 0.8232127859153063))) as fillet_1_piece_5_section:
        with BuildLine():
            CenterArc((FILLET_1_R, FILLET_1_R), FILLET_1_R, 180, 90)
            Line((0, FILLET_1_R), (0, 0))
            Line((0, 0), (FILLET_1_R, 0))
        make_face()
    fillet_1_piece_5 = extrude(amount=45.170872431, mode=Mode.PRIVATE)
    fillet_1_piece_5 = split(fillet_1_piece_5, bisect_by=Plane(origin=(-6.25, 1.968573348, 12), z_dir=(0, 0, 1)), keep=Keep.TOP, mode=Mode.PRIVATE)
    fillet_1_piece_5 = split(fillet_1_piece_5, bisect_by=Plane(origin=(-6.25, 1.968573348, 33.75), z_dir=(0, 0, -1)), keep=Keep.TOP, mode=Mode.PRIVATE)
    add(fillet_1_piece_5)
    with BuildSketch(Plane(origin=(-6.25, 1.968573348, 7.717619868), x_dir=(0, -0.8232127859153062, -0.5677329558036597), z_dir=(0, 0.5677329558036597, -0.8232127859153062))) as fillet_1_piece_6_section:
        with BuildLine():
            CenterArc((FILLET_1_R, -FILLET_1_R), FILLET_1_R, 90, 90)
            Line((0, -FILLET_1_R), (0, 0))
            Line((0, 0), (FILLET_1_R, 0))
        make_face()
    fillet_1_piece_6 = extrude(amount=45.170872431, mode=Mode.PRIVATE)
    fillet_1_piece_6 = split(fillet_1_piece_6, bisect_by=Plane(origin=(-6.25, 1.968573348, 0), z_dir=(0, 0, -1)), keep=Keep.TOP, mode=Mode.PRIVATE)
    fillet_1_piece_6 = split(fillet_1_piece_6, bisect_by=Plane(origin=(-6.25, 1.968573348, -21.75), z_dir=(0, 0, 1)), keep=Keep.TOP, mode=Mode.PRIVATE)
    add(fillet_1_piece_6)

    # 필렛2
    fillet_2_edges = [part.edges().sort_by_distance(p)[0] for p in [
        (8.125, -11.897631945, 33.75),
        (8.125, -11.897631945, -21.75),
        (-8.125, -11.897631945, 33.75),
        (-8.125, -11.897631945, -21.75),
    ]]
    fillet(fillet_2_edges, radius=FILLET_2_R)

    # 스케치21 → 컷-돌출5 (cut)
    with BuildSketch(Plane(origin=(0, 22.291069809, 0), x_dir=(1, 0, 0), z_dir=(0, 1, 0))):
        with Locations(Location((5, 9, 0), (0, 0, 270))):
            Circle(SKETCH_21_R)
        with Locations(Location((5, -1, 0), (0, 0, 270))):
            Circle(SKETCH_21_R)
        with Locations(Location((-5, 9, 0), (0, 0, 90))):
            Circle(SKETCH_21_R)
        with Locations(Location((-5, -1, 0), (0, 0, 90))):
            Circle(SKETCH_21_R)
        with Locations(Location((5, -11, 0), (0, 0, 90))):
            Circle(SKETCH_21_R)
        with Locations(Location((5, -21, 0), (0, 0, 90))):
            Circle(SKETCH_21_R)
        with Locations(Location((-5, -21, 0), (0, 0, 270))):
            Circle(SKETCH_21_R)
        with Locations(Location((-5, -11, 0), (0, 0, 270))):
            Circle(SKETCH_21_R)
    extrude(amount=-CUT_EXTRUDE_5_DEPTH, mode=Mode.SUBTRACT)


solid = part.part
